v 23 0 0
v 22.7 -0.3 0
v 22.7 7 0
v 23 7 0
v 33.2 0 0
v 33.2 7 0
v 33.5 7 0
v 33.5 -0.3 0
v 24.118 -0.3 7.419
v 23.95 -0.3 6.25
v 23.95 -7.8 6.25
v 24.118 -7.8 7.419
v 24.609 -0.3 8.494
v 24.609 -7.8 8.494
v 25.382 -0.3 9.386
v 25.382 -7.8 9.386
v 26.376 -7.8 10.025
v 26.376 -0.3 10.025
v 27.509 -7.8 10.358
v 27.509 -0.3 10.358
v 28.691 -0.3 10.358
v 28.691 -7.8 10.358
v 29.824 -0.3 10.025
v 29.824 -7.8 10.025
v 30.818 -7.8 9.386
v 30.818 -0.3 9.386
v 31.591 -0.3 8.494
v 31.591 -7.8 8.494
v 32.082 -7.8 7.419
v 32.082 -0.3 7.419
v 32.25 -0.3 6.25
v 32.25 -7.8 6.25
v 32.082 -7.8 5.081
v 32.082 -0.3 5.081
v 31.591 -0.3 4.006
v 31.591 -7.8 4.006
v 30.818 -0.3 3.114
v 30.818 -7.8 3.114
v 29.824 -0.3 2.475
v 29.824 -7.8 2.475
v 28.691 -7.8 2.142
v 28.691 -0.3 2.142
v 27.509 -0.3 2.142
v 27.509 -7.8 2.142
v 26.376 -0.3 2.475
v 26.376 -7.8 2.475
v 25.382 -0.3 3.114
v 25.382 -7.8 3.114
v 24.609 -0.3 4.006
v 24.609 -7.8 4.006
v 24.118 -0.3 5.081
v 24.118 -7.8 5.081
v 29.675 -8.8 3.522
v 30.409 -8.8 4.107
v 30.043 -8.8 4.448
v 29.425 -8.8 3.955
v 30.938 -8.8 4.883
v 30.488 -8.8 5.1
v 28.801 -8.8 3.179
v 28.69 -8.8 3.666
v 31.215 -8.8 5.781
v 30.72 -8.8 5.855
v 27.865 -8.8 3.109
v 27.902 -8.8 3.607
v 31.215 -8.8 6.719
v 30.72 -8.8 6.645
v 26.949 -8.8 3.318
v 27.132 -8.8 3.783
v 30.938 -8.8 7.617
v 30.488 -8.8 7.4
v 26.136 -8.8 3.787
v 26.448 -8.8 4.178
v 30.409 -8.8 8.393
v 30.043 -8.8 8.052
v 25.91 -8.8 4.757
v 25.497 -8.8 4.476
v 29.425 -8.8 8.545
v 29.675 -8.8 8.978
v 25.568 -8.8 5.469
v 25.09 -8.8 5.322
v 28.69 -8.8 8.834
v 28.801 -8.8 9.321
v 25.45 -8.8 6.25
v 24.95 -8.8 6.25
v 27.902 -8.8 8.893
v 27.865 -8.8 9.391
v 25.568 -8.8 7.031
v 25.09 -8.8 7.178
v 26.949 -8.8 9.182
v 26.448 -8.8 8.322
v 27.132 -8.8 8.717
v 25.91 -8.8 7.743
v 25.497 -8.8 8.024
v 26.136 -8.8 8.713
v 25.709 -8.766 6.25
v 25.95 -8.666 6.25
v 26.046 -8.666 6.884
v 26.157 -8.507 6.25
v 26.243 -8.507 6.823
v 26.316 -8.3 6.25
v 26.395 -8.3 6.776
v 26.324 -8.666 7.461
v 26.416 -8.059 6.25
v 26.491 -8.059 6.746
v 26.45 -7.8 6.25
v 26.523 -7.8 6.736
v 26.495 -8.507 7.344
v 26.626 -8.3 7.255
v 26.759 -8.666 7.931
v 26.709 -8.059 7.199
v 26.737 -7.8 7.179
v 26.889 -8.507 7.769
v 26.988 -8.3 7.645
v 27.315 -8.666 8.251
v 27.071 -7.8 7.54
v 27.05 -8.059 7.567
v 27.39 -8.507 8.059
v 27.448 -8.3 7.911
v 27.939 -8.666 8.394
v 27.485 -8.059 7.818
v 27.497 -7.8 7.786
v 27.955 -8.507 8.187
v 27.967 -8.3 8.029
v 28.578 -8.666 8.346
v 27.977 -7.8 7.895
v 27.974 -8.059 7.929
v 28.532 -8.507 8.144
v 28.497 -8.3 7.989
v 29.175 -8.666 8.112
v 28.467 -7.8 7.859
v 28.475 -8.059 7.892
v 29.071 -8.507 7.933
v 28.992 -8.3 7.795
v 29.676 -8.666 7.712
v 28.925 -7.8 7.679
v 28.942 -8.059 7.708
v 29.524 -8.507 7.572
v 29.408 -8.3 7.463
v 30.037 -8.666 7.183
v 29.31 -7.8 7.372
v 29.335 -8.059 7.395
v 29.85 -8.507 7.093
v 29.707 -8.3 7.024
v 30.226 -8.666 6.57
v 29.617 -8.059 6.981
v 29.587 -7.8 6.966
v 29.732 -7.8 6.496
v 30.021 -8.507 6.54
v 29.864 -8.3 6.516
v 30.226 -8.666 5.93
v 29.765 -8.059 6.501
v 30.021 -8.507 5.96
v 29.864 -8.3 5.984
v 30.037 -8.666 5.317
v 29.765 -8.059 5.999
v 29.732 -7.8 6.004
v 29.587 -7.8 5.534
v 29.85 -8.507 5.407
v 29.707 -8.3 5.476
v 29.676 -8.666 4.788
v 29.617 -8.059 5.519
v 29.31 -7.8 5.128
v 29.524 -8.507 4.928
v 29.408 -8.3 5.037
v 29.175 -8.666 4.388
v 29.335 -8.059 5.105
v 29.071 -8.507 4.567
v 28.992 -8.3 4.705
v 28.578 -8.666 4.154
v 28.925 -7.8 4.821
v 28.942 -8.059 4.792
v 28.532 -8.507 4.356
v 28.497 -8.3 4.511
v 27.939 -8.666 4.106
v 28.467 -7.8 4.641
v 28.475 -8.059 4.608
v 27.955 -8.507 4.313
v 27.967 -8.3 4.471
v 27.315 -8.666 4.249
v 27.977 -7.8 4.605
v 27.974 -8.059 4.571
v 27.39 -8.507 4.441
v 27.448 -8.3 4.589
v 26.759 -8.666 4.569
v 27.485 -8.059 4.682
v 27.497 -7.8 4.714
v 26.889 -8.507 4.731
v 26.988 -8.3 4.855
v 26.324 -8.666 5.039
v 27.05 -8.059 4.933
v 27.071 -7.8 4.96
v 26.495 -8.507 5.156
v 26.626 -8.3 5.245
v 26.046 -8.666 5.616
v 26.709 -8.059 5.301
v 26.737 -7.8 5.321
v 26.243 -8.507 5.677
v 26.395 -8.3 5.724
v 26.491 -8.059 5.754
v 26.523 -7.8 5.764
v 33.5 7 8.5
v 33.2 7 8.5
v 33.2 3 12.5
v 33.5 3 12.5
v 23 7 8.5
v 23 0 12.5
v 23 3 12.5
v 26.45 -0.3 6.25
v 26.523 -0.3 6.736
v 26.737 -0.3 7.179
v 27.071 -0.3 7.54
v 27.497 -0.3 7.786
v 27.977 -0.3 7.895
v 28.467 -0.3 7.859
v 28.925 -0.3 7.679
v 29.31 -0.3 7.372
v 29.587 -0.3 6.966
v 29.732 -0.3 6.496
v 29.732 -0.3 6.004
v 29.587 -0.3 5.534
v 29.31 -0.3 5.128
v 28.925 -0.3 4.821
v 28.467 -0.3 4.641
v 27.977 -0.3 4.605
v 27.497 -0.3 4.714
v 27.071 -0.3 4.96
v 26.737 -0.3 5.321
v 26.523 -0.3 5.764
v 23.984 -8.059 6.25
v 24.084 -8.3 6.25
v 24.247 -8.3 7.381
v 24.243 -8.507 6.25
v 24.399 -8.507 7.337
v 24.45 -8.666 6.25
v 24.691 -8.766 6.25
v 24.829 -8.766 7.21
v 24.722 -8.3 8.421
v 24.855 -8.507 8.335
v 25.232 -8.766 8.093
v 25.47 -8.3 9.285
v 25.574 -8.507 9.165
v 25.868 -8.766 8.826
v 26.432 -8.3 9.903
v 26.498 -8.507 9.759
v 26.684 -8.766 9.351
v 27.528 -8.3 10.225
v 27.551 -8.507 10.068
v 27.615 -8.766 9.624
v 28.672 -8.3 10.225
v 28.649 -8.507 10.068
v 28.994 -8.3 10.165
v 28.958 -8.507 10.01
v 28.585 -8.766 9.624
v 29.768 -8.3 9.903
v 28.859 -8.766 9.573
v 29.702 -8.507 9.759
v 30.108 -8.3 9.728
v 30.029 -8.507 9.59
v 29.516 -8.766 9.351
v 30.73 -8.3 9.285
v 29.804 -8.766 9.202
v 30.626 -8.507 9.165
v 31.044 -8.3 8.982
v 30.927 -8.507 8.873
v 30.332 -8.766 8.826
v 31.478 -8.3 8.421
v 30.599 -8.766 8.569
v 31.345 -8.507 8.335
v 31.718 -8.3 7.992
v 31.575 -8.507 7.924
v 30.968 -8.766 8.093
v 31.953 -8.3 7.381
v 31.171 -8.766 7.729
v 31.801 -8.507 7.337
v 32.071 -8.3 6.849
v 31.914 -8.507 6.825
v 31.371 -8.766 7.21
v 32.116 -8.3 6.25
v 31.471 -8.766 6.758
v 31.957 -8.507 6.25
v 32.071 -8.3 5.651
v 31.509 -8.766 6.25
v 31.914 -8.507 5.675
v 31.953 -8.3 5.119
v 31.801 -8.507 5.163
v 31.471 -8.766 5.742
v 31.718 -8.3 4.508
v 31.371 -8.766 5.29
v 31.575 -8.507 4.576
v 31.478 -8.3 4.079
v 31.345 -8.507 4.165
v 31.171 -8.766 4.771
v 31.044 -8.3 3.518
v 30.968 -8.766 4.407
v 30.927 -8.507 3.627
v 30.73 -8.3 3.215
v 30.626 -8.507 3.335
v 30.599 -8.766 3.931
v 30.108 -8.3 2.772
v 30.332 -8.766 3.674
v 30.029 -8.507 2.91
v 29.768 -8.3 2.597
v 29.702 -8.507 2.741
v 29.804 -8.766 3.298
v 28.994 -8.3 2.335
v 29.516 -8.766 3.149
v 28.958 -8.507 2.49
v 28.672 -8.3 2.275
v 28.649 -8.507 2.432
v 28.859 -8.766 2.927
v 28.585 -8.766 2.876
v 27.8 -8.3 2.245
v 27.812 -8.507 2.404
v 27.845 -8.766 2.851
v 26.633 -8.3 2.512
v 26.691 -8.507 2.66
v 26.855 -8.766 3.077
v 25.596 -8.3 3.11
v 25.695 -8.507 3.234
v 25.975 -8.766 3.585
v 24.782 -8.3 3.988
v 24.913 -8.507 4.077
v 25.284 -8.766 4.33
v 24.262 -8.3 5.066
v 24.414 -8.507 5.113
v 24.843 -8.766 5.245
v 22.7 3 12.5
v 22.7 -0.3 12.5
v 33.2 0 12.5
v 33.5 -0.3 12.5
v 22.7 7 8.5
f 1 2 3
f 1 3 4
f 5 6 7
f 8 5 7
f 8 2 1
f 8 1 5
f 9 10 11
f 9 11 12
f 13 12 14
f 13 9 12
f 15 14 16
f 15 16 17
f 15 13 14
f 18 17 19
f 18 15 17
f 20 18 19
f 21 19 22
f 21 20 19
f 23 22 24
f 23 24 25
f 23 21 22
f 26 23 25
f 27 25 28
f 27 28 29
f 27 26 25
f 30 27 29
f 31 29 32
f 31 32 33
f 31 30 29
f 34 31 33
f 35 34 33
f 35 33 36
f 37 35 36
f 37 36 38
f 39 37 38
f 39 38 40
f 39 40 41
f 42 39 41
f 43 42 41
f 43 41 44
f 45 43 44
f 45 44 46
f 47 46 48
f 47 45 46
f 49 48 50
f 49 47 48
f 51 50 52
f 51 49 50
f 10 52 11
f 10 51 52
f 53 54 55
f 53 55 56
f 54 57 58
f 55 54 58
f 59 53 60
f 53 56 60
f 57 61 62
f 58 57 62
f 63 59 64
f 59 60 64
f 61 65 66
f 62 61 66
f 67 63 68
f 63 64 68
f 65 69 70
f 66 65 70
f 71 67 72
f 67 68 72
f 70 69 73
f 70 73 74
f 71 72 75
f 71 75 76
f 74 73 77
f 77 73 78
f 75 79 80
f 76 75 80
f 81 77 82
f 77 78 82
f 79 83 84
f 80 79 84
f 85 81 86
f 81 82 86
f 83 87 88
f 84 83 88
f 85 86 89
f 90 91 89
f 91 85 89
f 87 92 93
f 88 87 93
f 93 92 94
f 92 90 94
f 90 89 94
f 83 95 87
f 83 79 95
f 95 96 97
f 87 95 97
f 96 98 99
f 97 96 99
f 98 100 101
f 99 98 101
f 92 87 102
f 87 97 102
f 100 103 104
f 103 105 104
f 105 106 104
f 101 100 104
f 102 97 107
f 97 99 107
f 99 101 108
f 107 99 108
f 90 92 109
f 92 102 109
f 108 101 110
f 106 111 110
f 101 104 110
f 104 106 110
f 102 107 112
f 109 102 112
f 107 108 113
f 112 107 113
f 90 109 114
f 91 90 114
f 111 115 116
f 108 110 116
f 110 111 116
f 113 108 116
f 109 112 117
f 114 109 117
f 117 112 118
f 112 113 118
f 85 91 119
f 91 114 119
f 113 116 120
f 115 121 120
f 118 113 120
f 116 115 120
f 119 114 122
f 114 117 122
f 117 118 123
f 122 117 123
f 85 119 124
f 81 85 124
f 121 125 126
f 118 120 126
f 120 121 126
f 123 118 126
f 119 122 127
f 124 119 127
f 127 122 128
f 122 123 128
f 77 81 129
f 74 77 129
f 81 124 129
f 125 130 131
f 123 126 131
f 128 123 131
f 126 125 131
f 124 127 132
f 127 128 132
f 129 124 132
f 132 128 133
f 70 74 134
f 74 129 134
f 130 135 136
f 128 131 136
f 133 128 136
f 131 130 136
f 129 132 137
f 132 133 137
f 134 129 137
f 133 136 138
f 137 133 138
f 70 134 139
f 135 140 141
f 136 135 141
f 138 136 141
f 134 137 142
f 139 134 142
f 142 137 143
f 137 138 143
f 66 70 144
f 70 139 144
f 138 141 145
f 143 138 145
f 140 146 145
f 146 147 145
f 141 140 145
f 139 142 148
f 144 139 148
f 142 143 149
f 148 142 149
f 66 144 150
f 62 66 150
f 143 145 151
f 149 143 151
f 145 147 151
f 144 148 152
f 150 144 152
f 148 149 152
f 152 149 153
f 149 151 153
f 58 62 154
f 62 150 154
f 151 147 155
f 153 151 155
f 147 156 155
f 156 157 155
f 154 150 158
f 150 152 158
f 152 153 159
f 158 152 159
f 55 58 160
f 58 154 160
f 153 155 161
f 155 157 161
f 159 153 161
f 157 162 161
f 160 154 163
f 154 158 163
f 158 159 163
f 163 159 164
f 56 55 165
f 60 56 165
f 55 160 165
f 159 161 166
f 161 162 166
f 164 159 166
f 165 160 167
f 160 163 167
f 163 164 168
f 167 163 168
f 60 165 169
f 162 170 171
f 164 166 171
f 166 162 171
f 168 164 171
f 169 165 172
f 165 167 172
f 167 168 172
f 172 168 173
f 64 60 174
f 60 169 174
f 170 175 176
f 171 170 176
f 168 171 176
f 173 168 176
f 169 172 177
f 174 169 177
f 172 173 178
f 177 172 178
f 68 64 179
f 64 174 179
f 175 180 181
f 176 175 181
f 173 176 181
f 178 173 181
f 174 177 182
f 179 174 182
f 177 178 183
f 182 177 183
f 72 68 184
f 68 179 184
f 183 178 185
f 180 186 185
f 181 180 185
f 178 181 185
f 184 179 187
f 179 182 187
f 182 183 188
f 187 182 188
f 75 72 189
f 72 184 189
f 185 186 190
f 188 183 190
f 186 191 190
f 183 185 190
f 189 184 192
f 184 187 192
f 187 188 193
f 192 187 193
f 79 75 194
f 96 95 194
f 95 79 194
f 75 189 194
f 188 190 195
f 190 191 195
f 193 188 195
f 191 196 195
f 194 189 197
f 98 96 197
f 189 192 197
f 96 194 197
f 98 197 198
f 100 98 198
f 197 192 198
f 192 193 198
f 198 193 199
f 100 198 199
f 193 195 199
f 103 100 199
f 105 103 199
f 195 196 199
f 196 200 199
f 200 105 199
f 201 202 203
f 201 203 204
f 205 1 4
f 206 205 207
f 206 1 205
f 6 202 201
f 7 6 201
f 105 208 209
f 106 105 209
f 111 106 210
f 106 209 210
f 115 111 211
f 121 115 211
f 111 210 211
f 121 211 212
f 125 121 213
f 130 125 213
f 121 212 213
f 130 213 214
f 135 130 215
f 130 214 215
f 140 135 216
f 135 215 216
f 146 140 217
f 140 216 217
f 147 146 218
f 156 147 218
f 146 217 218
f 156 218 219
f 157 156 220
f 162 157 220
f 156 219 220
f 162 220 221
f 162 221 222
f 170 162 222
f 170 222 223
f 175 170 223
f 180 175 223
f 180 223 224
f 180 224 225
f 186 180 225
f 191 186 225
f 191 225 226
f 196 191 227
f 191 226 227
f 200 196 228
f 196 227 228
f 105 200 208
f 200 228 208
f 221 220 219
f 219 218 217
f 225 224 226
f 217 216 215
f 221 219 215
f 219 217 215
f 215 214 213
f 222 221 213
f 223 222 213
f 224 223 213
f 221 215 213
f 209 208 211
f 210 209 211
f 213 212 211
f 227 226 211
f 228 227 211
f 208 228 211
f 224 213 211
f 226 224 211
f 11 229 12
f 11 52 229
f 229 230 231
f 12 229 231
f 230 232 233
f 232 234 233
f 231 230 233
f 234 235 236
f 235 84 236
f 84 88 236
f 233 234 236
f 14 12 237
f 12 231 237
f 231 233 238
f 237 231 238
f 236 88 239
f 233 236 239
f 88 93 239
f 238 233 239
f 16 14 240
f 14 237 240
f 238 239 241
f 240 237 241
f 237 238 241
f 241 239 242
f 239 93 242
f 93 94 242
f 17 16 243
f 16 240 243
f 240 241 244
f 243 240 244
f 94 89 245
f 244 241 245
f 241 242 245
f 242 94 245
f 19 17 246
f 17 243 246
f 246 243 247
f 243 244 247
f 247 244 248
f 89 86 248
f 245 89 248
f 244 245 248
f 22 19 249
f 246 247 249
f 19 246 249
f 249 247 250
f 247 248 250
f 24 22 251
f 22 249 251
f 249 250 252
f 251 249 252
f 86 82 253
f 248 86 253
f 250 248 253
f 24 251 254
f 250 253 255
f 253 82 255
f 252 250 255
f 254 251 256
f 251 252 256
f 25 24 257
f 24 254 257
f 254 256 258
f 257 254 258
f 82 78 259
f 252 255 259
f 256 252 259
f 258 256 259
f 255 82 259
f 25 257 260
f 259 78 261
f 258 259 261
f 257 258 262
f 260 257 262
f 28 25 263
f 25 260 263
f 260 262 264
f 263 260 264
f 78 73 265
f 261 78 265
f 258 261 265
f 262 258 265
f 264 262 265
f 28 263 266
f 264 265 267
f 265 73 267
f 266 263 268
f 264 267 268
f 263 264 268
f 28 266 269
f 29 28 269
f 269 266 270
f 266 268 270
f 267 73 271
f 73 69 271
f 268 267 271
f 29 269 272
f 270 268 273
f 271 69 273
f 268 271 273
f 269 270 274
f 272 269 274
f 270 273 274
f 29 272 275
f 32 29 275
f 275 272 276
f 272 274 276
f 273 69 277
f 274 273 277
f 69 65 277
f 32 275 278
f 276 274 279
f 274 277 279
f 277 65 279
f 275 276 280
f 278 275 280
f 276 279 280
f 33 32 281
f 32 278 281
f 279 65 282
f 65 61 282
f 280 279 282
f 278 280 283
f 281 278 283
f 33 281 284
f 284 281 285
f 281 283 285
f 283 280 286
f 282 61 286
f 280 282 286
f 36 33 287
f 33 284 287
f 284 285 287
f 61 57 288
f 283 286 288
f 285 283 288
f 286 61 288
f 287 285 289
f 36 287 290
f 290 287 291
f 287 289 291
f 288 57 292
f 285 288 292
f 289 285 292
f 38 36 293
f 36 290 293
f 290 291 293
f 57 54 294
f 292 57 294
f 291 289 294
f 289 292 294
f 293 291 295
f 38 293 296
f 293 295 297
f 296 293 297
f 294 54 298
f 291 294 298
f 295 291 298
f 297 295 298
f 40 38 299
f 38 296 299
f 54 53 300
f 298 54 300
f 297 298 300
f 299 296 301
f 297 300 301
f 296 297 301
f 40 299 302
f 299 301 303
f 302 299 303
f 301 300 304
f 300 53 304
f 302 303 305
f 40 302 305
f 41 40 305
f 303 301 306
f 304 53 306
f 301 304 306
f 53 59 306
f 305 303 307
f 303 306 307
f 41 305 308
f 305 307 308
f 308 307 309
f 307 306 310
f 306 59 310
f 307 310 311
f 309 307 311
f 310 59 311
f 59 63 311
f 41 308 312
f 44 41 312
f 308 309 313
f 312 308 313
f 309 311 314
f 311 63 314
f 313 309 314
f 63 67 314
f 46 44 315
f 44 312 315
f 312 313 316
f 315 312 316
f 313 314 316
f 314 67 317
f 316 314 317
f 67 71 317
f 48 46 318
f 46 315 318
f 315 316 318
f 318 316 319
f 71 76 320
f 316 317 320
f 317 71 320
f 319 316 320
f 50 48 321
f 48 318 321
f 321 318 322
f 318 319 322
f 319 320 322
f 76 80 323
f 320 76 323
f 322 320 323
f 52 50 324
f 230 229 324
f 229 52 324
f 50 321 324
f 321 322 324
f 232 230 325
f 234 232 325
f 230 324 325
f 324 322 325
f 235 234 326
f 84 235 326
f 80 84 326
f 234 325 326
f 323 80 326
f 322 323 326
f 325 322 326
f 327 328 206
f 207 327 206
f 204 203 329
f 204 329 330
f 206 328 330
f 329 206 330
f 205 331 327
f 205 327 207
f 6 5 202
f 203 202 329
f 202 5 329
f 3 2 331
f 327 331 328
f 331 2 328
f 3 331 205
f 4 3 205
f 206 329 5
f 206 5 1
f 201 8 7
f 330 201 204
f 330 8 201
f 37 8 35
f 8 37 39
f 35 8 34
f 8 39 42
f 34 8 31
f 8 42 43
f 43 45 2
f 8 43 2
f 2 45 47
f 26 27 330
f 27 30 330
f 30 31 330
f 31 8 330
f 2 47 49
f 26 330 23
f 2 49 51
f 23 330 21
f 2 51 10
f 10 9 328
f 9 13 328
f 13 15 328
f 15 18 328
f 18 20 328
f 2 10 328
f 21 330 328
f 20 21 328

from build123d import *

# Parameters (mm, degrees)
SKETCH013_W   = 10.8
SKETCH013_H   = 12.5
PAD072_DEPTH  = 0.3
SKETCH014_W   = 0.3
SKETCH014_H   = 12.5
PAD073_DEPTH  = 7
SKETCH015_R   = 4.15
SKETCH015_R_2 = 1.65
PAD074_DEPTH  = 8.5
CHAMFER_SIZE  = 4
FILLET_R      = 1


with BuildPart() as part:
    # Sketch013 → Pad072 (new body)
    with BuildSketch(Plane(origin=(0, -0.3, 0), x_dir=(-1, 0, 0), z_dir=(0, 1, 0))):
        Rectangle(SKETCH013_W, SKETCH013_H)
    extrude(amount=PAD072_DEPTH)

    # Sketch014 → Pad073 (join)
    with BuildSketch(Plane.XZ):
        with Locations((5.25, 0)):
            Rectangle(SKETCH014_W, SKETCH014_H)
        with Locations((-5.25, 0)):
            Rectangle(SKETCH014_W, SKETCH014_H)
    extrude(amount=-PAD073_DEPTH)

    # Sketch015 → Pad074 (join)
    with BuildSketch(Plane(origin=(0, -0.3, 0), x_dir=(-1, 0, 0), z_dir=(0, 1, 0))):
        Circle(SKETCH015_R)
        Circle(SKETCH015_R_2, mode=Mode.SUBTRACT)
    extrude(amount=-PAD074_DEPTH)

    # Chamfer
    chamfer_edges = [part.edges().sort_by_distance(p)[0] for p in [
        (-5.25, 7, 6.25),
        (5.25, 7, 6.25),
    ]]
    chamfer(chamfer_edges, length=CHAMFER_SIZE)

    # Fillet
    fillet_edges = [part.edges().sort_by_distance(p)[0] for p in [
        (4.15, -8.8, 0),
        (1.65, -8.8, 0),
    ]]
    fillet(fillet_edges, radius=FILLET_R)


with BuildPart() as part_1:
    # Pad019Body placement: moved
    add(part.part.moved(Location((28.1, 0, 6.25))))


solid = part_1.part
